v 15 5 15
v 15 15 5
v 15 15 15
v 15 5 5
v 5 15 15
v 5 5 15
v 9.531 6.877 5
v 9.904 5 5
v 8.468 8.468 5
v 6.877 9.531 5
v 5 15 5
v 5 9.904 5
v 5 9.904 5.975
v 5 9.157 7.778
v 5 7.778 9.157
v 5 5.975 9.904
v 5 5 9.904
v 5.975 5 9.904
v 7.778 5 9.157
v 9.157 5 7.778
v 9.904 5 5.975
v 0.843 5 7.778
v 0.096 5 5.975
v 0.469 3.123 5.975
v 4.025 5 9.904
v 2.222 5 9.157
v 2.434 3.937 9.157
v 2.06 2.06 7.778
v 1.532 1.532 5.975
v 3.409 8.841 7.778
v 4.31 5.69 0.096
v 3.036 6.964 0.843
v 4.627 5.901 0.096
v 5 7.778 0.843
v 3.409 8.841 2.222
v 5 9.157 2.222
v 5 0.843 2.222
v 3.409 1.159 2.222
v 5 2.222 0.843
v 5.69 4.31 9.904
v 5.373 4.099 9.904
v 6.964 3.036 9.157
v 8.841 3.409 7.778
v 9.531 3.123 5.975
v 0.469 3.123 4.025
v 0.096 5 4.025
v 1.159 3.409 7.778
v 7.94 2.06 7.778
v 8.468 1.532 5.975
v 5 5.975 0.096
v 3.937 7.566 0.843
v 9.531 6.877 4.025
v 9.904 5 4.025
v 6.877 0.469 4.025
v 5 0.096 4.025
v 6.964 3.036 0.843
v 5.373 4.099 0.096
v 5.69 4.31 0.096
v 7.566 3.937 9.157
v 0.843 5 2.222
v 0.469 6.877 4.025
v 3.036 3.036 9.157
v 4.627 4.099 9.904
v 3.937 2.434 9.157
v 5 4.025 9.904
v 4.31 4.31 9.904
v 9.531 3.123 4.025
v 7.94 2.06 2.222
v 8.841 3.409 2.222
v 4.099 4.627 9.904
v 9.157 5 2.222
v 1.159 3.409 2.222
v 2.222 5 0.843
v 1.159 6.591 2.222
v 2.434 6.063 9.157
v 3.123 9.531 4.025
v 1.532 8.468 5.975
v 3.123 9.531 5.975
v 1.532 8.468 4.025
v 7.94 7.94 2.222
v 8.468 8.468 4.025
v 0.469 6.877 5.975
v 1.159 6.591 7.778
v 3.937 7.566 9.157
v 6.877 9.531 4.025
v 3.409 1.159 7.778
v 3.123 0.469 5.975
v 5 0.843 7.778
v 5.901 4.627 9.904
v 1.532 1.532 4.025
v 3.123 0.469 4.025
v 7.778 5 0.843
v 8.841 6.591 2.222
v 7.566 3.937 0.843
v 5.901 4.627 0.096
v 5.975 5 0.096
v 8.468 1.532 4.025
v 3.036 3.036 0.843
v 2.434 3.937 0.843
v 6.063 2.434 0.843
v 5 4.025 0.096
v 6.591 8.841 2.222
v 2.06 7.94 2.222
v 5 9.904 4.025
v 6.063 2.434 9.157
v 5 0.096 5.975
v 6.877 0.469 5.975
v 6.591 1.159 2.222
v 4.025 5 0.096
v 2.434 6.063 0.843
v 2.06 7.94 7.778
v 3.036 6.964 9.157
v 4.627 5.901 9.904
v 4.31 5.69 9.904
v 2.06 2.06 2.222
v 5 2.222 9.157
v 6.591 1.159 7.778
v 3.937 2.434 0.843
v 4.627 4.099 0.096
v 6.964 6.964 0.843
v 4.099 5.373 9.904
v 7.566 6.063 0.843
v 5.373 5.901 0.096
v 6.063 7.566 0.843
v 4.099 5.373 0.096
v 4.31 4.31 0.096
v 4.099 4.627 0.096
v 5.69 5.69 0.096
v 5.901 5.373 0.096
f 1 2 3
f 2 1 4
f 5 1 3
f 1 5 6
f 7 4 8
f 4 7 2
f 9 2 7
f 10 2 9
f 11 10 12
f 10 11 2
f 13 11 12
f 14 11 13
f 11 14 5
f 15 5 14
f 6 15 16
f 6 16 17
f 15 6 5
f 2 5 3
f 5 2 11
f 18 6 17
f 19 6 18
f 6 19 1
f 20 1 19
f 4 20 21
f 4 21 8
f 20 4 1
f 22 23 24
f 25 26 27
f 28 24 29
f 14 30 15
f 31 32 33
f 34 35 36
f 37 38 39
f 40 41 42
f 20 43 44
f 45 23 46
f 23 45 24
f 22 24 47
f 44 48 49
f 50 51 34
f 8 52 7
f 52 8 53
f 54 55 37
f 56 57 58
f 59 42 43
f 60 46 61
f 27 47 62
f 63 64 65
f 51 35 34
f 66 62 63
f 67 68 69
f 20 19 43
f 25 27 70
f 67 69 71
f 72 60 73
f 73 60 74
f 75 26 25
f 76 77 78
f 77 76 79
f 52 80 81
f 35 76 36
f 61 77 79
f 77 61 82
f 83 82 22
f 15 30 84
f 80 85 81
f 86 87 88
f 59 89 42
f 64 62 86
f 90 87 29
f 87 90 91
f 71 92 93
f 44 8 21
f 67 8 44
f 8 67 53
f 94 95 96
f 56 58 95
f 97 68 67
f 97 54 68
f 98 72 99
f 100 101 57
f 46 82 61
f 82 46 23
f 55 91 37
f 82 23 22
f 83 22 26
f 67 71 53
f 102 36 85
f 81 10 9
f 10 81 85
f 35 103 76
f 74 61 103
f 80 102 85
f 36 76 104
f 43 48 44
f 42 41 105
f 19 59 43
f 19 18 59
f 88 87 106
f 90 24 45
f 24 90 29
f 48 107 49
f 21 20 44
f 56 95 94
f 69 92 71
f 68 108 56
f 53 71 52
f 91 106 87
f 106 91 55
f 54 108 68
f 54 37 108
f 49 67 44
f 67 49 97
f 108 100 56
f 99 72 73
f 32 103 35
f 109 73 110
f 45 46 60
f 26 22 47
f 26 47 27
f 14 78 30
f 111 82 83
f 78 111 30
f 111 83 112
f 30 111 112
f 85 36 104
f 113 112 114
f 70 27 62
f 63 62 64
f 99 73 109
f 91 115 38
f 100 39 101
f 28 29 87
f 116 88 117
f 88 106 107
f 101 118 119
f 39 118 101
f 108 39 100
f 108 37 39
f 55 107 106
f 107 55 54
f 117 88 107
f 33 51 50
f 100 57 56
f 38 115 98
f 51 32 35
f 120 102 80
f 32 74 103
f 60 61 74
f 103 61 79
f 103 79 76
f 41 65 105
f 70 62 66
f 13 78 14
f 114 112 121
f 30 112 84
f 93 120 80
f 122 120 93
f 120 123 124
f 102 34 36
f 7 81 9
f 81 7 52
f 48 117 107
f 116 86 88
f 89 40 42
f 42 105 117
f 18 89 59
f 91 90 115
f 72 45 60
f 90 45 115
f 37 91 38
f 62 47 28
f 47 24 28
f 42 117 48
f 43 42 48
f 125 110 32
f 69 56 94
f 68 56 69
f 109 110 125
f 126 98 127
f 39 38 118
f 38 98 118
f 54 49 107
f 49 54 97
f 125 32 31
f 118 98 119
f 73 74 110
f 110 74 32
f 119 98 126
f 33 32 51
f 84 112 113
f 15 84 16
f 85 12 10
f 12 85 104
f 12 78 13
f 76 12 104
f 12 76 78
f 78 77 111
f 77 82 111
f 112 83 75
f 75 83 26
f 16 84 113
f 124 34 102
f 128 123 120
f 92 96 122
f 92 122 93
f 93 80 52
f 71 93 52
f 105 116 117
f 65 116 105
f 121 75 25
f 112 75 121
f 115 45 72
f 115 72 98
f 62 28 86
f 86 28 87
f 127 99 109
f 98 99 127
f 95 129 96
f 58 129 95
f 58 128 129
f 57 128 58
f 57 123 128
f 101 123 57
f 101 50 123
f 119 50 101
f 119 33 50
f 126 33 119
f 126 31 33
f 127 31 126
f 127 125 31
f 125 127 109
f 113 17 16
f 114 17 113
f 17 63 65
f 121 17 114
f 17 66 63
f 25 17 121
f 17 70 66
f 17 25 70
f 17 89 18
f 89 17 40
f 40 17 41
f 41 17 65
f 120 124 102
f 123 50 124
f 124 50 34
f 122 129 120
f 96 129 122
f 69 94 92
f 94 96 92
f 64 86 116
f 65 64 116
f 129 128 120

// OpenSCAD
translate([5, 5, 5]) union(){
                        cube([10,10,10]);
                        sphere(5);
                      }
